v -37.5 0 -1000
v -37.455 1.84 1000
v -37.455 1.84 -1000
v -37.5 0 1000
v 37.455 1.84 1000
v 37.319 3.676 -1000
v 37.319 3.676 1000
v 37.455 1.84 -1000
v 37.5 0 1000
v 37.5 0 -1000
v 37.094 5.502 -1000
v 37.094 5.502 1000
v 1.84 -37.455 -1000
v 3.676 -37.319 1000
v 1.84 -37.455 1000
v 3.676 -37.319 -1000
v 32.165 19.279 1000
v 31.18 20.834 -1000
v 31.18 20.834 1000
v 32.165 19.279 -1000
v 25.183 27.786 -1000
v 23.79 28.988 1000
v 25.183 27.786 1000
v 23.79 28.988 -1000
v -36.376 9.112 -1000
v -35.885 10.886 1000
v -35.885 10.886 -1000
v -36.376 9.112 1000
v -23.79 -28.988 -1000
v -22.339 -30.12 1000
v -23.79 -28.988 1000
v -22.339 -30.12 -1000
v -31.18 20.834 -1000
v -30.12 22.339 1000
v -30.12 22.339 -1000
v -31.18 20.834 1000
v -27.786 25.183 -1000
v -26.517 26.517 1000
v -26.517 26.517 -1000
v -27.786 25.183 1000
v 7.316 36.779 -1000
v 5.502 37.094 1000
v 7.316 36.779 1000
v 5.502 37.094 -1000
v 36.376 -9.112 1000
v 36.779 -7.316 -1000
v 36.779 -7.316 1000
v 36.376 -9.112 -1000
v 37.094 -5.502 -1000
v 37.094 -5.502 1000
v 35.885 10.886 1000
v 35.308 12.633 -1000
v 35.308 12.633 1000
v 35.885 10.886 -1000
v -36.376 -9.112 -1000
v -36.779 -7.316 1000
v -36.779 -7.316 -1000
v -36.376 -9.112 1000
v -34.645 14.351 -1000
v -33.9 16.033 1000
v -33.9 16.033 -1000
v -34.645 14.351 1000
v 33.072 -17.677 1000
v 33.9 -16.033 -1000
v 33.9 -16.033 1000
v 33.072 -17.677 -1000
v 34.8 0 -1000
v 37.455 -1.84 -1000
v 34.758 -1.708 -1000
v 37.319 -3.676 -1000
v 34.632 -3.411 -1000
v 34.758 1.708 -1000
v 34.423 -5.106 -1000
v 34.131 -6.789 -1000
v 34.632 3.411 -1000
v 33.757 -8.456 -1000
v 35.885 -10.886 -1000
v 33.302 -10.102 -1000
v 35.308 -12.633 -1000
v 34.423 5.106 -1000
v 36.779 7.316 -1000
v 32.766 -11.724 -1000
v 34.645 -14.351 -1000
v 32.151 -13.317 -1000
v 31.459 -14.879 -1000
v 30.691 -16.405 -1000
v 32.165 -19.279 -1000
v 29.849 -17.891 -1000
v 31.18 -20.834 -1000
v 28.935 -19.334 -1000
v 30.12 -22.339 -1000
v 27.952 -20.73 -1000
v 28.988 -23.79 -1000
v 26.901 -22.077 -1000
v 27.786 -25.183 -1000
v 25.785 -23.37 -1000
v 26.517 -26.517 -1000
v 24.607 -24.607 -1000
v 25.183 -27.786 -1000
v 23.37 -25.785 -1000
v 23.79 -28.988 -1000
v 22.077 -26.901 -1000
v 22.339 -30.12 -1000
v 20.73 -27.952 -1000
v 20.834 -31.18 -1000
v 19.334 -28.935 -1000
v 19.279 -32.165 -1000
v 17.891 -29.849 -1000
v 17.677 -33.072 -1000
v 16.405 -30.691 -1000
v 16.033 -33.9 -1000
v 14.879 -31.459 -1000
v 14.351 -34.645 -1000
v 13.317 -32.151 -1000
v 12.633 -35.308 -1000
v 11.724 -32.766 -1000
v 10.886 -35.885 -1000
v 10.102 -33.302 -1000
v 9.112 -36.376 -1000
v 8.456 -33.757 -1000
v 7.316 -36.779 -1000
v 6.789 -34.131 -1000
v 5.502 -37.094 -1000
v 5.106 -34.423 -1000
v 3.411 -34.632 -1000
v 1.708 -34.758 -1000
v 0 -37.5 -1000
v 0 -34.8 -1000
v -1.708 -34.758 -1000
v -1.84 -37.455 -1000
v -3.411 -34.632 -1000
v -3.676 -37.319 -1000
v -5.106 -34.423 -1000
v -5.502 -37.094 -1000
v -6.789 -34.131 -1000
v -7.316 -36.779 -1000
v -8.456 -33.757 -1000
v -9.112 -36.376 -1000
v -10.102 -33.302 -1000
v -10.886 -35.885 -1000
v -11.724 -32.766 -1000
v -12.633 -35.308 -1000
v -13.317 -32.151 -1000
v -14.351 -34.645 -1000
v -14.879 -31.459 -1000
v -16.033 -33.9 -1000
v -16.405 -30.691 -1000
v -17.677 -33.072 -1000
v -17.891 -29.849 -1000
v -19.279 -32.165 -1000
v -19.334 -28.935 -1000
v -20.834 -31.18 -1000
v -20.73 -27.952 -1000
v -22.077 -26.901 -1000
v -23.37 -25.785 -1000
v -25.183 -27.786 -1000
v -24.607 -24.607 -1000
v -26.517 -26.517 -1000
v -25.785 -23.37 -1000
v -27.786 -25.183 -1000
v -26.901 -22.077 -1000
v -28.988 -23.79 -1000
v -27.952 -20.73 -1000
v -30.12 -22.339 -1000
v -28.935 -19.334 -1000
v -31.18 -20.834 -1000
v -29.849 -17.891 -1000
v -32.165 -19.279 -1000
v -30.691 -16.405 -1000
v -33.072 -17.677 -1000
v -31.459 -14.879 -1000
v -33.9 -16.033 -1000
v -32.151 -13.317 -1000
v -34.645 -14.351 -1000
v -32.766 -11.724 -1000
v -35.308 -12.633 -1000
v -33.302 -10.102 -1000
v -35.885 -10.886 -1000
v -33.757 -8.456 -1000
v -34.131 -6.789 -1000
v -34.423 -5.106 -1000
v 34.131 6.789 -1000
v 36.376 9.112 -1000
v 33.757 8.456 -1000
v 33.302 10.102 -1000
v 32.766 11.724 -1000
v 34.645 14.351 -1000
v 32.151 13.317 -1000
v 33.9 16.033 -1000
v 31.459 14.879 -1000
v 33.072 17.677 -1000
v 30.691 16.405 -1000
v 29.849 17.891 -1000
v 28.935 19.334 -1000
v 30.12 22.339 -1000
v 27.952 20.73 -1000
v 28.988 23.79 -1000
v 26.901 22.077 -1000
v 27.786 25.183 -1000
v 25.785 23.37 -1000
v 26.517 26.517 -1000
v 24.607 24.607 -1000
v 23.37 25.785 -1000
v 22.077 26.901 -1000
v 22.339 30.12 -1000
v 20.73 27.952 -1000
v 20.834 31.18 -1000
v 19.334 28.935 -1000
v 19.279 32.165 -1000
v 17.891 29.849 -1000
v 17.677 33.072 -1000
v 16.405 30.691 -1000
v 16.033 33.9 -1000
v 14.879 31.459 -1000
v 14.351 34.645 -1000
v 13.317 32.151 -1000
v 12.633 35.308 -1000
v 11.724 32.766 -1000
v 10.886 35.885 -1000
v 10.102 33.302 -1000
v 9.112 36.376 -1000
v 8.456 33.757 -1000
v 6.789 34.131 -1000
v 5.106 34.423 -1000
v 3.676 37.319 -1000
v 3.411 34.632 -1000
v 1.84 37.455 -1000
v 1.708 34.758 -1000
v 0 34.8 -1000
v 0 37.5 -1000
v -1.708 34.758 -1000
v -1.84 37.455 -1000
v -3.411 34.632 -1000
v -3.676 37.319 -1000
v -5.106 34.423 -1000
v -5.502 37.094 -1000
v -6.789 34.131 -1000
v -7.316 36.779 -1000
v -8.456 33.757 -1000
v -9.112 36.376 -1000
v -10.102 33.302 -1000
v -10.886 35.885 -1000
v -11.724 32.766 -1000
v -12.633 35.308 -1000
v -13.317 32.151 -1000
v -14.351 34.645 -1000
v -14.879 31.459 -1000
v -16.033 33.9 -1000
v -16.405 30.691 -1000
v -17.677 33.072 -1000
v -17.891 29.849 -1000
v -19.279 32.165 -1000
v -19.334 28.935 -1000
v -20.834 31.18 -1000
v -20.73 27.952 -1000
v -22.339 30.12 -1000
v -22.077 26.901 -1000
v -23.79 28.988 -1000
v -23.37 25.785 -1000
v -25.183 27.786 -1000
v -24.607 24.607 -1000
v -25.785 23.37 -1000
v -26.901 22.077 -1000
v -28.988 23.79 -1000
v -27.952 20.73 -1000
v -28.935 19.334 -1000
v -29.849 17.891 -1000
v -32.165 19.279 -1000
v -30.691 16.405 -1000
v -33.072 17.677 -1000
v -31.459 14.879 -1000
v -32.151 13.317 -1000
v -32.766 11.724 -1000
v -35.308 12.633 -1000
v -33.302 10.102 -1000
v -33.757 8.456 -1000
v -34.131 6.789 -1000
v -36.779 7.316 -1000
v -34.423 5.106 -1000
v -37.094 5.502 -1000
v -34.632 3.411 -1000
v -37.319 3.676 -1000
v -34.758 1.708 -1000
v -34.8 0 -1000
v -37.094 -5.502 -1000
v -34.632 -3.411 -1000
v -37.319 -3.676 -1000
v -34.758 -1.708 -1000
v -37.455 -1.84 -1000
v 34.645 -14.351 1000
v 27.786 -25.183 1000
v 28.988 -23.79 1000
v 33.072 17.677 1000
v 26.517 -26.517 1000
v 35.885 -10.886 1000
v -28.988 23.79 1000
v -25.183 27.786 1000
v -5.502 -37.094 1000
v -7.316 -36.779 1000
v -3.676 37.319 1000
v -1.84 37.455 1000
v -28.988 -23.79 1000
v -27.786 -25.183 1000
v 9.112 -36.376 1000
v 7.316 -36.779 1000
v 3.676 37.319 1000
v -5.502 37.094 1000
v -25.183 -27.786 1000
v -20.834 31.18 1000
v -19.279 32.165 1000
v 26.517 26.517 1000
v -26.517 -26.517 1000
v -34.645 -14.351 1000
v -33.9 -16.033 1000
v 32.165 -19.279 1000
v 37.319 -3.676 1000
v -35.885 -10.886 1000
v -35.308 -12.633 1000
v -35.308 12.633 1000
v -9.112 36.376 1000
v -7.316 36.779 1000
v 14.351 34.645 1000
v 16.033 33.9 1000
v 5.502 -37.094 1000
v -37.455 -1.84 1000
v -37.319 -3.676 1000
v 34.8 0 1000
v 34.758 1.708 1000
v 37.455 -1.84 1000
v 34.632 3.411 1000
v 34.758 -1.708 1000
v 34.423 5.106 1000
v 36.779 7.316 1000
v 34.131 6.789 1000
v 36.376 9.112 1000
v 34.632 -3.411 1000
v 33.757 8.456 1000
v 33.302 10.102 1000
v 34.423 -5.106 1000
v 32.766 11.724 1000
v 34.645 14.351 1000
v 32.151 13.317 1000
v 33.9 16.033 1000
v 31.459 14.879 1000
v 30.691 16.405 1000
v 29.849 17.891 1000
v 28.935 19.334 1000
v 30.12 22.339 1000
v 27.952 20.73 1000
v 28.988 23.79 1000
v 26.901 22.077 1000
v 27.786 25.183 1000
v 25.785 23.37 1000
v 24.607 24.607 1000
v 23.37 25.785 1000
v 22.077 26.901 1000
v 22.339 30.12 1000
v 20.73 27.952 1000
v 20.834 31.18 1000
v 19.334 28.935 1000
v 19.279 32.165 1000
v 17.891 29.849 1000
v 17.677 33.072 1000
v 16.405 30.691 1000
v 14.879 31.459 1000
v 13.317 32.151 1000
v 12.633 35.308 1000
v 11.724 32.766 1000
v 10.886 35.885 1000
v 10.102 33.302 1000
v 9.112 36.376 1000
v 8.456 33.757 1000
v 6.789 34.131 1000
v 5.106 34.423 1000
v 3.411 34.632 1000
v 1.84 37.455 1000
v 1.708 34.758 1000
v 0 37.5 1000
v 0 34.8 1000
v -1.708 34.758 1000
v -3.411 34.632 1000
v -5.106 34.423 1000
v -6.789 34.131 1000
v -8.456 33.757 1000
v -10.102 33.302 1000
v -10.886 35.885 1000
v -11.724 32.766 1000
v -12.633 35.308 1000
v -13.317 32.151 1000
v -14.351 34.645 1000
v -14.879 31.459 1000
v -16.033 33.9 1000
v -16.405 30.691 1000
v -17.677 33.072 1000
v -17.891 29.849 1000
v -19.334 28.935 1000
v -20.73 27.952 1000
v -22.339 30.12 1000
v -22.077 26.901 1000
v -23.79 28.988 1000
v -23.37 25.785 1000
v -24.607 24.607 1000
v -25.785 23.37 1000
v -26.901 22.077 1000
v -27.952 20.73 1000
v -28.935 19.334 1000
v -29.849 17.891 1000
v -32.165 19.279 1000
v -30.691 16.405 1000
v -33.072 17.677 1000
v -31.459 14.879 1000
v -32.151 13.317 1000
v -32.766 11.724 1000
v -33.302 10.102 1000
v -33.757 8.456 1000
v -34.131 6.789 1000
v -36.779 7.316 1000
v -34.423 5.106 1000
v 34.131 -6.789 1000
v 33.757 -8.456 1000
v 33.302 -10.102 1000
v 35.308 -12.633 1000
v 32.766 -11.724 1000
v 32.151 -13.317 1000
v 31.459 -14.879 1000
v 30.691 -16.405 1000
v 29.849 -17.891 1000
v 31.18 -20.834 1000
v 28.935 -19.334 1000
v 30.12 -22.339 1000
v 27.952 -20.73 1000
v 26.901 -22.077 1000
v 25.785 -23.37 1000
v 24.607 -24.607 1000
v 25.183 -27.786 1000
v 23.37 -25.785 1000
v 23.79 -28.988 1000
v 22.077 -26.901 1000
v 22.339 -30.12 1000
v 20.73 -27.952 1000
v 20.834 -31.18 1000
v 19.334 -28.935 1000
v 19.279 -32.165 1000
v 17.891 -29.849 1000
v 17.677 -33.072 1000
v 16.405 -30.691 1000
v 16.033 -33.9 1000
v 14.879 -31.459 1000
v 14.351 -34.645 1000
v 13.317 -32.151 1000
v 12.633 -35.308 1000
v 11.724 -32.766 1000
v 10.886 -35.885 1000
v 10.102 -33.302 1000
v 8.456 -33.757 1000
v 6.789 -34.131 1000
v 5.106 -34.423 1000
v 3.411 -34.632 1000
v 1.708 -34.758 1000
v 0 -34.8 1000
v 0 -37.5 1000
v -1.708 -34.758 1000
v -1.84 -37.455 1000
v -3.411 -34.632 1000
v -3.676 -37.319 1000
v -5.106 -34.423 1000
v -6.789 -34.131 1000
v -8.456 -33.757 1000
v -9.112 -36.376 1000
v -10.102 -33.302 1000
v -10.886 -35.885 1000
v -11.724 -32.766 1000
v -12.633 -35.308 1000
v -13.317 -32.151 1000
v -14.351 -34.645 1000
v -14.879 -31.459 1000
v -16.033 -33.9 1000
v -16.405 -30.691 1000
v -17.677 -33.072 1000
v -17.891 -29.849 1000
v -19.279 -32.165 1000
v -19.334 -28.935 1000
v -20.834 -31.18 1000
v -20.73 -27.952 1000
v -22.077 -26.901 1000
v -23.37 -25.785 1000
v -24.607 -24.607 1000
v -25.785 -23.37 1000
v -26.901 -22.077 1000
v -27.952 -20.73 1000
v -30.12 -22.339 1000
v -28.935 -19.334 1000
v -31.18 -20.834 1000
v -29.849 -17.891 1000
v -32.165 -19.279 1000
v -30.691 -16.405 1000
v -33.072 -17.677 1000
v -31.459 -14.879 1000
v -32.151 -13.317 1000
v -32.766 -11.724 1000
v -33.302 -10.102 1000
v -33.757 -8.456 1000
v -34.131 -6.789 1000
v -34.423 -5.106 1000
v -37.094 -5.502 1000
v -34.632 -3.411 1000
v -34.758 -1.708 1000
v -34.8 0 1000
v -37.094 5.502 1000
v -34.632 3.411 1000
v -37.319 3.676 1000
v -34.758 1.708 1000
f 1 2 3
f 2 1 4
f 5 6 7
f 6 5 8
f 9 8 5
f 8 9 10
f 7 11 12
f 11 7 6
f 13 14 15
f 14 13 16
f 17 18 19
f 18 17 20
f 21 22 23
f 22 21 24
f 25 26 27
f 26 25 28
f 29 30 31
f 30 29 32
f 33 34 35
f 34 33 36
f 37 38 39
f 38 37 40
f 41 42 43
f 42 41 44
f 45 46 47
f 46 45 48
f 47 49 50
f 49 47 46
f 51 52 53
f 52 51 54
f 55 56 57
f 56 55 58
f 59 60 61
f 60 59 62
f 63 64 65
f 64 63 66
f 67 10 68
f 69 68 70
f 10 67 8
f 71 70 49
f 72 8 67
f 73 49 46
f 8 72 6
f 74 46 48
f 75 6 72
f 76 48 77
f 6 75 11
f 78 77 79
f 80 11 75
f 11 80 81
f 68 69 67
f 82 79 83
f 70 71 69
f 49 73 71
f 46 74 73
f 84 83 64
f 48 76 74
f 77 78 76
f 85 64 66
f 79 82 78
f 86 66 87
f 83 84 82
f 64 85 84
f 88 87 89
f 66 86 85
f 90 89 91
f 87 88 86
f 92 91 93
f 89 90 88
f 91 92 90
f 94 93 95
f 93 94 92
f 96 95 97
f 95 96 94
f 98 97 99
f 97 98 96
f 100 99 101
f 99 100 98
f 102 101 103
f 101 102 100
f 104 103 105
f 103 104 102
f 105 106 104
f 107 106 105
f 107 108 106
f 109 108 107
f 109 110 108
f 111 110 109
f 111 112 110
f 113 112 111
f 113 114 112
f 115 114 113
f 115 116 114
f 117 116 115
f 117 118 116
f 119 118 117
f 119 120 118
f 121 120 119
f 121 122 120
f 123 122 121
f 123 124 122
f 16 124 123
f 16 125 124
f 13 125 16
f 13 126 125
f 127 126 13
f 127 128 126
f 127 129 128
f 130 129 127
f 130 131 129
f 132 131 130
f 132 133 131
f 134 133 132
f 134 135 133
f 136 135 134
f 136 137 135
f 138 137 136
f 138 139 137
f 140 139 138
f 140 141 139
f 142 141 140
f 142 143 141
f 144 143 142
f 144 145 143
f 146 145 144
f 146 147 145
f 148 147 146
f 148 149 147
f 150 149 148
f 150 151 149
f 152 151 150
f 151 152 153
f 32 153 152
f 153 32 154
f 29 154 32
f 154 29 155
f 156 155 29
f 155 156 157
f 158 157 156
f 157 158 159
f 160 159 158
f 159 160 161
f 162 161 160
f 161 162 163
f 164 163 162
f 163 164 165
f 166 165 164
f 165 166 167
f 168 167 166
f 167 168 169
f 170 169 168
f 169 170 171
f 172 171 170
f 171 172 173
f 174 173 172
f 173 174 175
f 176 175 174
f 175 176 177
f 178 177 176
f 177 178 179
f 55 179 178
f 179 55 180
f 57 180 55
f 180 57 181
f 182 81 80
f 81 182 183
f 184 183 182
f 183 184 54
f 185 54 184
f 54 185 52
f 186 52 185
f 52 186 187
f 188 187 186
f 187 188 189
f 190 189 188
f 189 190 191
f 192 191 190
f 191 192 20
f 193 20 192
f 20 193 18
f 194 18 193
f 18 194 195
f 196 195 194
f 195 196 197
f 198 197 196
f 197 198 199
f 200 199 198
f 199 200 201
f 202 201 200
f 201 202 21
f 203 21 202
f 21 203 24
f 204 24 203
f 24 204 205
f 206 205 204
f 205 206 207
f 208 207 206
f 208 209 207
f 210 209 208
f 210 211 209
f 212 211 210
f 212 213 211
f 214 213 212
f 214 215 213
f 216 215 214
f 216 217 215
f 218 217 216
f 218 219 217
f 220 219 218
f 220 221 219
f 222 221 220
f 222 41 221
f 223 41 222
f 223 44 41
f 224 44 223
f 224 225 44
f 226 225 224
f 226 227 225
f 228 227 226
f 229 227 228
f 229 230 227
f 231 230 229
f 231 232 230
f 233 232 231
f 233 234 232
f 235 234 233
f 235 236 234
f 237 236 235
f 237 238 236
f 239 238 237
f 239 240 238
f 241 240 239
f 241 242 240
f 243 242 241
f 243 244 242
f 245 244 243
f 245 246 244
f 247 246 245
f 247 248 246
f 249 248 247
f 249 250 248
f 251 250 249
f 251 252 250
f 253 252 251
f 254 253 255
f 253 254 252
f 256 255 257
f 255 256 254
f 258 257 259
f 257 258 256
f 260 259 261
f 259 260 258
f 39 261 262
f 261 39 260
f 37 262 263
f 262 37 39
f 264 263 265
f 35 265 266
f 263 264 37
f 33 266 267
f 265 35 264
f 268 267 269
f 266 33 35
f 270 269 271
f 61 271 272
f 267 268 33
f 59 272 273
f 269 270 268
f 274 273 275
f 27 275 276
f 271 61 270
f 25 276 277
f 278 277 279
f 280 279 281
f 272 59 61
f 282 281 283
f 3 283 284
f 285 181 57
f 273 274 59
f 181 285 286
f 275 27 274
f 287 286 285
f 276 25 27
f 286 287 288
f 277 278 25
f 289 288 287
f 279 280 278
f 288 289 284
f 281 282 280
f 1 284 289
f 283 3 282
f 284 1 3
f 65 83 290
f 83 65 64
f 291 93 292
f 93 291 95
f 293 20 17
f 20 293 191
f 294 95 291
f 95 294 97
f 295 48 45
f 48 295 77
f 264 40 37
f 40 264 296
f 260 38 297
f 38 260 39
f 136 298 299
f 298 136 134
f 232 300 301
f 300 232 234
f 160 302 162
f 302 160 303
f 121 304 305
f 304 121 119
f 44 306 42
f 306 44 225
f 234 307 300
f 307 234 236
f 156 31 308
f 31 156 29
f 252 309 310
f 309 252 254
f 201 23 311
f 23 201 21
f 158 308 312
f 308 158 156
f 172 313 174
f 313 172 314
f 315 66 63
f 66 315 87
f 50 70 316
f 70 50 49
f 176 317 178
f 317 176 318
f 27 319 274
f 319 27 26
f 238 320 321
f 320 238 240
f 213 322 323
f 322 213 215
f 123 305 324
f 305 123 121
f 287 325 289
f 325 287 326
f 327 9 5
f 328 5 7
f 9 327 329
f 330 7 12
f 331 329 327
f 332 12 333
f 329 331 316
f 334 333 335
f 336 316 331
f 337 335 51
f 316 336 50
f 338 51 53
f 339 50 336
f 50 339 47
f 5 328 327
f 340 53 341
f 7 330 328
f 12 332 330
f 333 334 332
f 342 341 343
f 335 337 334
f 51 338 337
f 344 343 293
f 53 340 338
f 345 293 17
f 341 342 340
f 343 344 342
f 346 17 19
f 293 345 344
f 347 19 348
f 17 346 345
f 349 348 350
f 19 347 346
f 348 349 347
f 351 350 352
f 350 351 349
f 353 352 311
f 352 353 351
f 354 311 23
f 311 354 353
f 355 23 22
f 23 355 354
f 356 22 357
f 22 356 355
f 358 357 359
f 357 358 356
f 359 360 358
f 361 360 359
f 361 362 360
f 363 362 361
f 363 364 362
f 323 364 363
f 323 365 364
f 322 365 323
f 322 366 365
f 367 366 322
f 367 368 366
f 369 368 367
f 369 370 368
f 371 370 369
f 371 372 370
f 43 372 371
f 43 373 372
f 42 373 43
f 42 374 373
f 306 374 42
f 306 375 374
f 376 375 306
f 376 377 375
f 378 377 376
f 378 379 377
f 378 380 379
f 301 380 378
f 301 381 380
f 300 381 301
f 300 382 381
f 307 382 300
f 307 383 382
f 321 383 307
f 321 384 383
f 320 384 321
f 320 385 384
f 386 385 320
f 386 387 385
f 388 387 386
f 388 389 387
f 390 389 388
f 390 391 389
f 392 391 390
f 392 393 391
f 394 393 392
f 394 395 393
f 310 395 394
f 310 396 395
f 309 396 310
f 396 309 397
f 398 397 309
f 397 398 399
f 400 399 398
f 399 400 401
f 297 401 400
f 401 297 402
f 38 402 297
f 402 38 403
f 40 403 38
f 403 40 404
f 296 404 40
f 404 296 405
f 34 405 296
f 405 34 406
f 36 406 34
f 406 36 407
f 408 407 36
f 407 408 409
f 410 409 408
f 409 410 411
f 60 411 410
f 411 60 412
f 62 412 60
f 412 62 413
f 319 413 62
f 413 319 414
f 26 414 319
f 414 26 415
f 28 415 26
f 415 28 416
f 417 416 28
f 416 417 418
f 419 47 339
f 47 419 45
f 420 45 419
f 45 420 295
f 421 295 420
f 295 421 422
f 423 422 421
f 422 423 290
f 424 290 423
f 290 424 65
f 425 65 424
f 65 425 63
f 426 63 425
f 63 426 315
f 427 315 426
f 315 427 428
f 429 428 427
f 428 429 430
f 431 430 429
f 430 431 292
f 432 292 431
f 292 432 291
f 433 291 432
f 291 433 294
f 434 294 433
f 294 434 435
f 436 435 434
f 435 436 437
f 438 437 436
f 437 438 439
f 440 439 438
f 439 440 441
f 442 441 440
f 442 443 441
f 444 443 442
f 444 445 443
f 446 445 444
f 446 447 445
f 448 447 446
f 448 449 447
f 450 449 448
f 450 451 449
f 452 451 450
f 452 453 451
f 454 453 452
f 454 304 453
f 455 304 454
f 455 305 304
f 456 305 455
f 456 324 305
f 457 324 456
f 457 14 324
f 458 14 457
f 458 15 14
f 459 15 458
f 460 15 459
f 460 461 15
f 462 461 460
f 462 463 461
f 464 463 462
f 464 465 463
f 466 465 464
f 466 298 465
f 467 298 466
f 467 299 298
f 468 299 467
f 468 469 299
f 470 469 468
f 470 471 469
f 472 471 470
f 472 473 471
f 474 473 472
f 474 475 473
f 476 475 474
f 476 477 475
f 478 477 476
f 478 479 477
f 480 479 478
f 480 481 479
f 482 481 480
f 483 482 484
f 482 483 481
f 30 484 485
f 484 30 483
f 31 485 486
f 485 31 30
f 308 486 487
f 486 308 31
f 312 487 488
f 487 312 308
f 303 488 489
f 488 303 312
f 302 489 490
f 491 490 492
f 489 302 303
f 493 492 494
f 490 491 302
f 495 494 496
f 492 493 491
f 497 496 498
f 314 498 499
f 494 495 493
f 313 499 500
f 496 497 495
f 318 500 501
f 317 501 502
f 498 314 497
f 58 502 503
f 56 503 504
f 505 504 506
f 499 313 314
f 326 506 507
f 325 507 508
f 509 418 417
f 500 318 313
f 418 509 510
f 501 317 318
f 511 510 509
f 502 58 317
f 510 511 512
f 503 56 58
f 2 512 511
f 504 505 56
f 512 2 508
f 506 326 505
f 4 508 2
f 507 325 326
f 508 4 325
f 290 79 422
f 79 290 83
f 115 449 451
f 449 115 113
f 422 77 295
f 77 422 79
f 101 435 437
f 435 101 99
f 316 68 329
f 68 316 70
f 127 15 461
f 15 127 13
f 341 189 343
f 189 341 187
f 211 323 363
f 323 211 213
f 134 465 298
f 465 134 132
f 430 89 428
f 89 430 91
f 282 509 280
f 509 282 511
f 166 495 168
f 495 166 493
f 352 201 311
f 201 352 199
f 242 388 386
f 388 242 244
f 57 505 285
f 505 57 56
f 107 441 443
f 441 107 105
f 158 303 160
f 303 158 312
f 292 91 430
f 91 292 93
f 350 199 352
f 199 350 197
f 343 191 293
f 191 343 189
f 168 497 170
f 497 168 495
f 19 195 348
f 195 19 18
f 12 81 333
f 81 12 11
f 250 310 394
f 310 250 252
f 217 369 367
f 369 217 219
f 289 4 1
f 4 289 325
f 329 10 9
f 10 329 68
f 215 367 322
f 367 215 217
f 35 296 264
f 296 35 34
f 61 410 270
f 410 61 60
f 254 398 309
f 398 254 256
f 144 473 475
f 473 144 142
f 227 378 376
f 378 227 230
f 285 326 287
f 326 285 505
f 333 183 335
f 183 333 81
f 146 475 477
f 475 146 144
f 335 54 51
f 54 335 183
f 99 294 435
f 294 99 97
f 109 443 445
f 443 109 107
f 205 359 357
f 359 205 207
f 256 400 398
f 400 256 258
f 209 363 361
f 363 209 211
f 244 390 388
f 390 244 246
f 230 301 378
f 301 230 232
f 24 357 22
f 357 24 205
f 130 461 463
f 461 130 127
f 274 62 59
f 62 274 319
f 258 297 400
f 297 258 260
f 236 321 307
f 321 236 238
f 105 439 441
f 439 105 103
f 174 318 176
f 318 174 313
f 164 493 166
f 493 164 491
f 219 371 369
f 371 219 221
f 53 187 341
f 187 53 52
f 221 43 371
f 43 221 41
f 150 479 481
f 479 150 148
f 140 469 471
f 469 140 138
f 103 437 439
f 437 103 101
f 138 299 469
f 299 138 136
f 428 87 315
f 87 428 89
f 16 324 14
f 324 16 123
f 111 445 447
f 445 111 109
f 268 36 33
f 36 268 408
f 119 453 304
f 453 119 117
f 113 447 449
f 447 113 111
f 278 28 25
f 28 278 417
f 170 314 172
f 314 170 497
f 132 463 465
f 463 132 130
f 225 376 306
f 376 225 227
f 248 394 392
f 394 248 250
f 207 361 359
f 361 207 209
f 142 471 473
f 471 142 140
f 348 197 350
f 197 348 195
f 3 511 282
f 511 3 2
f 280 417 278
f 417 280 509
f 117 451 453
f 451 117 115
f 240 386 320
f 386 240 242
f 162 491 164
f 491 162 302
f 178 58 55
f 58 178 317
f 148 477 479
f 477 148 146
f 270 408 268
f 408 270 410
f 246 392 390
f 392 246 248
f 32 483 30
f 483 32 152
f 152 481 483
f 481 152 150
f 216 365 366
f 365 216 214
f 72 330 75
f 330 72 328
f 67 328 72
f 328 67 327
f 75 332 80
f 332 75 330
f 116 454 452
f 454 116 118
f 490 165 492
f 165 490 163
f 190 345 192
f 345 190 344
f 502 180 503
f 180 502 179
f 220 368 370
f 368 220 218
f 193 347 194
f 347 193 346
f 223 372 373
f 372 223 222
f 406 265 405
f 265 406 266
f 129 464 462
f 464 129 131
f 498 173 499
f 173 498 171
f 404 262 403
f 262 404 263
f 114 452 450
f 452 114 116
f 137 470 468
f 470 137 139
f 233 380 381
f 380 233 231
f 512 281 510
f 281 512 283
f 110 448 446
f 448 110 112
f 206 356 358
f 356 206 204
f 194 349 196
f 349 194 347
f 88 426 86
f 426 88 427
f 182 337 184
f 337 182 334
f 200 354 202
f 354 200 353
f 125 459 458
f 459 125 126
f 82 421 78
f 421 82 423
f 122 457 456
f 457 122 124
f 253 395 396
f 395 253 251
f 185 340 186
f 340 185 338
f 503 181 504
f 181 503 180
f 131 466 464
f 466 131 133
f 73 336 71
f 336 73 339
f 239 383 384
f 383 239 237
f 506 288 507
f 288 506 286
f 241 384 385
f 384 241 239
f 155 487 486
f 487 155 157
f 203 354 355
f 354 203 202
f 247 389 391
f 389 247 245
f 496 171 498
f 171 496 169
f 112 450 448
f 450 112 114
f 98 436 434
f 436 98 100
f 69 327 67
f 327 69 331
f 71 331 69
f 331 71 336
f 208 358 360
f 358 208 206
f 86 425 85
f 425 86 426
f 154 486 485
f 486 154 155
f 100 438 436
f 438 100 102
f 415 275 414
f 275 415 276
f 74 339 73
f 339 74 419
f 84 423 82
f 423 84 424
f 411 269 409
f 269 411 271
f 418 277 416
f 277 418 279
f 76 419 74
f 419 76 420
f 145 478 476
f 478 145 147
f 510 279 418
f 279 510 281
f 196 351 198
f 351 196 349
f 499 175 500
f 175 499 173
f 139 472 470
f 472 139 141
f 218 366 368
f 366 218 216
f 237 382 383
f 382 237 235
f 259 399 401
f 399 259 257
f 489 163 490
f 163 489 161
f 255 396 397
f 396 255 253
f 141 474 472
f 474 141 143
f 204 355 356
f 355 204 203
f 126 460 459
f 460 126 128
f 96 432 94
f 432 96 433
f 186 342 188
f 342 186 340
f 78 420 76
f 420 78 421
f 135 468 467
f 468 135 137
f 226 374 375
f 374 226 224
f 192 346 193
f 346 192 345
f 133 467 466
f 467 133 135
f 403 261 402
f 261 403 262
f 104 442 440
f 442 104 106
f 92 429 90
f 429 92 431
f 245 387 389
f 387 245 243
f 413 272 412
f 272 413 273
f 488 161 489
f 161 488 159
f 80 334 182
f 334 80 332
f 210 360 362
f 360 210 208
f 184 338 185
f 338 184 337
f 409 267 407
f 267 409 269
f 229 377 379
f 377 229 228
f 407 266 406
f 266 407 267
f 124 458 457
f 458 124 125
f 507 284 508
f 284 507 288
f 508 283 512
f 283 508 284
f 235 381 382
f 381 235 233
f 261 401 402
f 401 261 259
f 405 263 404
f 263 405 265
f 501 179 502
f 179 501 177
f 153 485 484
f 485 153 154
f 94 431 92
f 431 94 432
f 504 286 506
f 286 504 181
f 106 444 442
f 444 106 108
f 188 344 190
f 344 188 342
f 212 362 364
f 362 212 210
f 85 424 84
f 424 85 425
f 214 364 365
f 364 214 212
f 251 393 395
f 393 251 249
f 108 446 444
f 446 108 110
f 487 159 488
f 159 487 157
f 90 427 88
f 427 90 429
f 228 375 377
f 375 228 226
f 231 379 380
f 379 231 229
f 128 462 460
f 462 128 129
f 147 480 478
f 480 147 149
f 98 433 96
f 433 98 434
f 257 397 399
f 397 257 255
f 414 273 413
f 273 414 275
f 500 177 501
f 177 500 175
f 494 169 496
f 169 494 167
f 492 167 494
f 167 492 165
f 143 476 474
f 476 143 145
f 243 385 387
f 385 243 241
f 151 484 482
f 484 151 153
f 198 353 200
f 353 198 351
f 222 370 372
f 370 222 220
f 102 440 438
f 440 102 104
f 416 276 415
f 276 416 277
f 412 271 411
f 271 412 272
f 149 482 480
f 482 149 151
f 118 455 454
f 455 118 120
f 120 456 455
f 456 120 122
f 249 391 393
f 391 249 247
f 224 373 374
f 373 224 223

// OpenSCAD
$fn=128;

module ht_pipe(od=75, length=2000, wall=2.7) {
    difference() {
        cylinder(h=length, d=od, center=true);
        cylinder(h=length+2, d=od-2*wall, center=true);
    }
}

ht_pipe(od=75, length=2000, wall=2.7);
